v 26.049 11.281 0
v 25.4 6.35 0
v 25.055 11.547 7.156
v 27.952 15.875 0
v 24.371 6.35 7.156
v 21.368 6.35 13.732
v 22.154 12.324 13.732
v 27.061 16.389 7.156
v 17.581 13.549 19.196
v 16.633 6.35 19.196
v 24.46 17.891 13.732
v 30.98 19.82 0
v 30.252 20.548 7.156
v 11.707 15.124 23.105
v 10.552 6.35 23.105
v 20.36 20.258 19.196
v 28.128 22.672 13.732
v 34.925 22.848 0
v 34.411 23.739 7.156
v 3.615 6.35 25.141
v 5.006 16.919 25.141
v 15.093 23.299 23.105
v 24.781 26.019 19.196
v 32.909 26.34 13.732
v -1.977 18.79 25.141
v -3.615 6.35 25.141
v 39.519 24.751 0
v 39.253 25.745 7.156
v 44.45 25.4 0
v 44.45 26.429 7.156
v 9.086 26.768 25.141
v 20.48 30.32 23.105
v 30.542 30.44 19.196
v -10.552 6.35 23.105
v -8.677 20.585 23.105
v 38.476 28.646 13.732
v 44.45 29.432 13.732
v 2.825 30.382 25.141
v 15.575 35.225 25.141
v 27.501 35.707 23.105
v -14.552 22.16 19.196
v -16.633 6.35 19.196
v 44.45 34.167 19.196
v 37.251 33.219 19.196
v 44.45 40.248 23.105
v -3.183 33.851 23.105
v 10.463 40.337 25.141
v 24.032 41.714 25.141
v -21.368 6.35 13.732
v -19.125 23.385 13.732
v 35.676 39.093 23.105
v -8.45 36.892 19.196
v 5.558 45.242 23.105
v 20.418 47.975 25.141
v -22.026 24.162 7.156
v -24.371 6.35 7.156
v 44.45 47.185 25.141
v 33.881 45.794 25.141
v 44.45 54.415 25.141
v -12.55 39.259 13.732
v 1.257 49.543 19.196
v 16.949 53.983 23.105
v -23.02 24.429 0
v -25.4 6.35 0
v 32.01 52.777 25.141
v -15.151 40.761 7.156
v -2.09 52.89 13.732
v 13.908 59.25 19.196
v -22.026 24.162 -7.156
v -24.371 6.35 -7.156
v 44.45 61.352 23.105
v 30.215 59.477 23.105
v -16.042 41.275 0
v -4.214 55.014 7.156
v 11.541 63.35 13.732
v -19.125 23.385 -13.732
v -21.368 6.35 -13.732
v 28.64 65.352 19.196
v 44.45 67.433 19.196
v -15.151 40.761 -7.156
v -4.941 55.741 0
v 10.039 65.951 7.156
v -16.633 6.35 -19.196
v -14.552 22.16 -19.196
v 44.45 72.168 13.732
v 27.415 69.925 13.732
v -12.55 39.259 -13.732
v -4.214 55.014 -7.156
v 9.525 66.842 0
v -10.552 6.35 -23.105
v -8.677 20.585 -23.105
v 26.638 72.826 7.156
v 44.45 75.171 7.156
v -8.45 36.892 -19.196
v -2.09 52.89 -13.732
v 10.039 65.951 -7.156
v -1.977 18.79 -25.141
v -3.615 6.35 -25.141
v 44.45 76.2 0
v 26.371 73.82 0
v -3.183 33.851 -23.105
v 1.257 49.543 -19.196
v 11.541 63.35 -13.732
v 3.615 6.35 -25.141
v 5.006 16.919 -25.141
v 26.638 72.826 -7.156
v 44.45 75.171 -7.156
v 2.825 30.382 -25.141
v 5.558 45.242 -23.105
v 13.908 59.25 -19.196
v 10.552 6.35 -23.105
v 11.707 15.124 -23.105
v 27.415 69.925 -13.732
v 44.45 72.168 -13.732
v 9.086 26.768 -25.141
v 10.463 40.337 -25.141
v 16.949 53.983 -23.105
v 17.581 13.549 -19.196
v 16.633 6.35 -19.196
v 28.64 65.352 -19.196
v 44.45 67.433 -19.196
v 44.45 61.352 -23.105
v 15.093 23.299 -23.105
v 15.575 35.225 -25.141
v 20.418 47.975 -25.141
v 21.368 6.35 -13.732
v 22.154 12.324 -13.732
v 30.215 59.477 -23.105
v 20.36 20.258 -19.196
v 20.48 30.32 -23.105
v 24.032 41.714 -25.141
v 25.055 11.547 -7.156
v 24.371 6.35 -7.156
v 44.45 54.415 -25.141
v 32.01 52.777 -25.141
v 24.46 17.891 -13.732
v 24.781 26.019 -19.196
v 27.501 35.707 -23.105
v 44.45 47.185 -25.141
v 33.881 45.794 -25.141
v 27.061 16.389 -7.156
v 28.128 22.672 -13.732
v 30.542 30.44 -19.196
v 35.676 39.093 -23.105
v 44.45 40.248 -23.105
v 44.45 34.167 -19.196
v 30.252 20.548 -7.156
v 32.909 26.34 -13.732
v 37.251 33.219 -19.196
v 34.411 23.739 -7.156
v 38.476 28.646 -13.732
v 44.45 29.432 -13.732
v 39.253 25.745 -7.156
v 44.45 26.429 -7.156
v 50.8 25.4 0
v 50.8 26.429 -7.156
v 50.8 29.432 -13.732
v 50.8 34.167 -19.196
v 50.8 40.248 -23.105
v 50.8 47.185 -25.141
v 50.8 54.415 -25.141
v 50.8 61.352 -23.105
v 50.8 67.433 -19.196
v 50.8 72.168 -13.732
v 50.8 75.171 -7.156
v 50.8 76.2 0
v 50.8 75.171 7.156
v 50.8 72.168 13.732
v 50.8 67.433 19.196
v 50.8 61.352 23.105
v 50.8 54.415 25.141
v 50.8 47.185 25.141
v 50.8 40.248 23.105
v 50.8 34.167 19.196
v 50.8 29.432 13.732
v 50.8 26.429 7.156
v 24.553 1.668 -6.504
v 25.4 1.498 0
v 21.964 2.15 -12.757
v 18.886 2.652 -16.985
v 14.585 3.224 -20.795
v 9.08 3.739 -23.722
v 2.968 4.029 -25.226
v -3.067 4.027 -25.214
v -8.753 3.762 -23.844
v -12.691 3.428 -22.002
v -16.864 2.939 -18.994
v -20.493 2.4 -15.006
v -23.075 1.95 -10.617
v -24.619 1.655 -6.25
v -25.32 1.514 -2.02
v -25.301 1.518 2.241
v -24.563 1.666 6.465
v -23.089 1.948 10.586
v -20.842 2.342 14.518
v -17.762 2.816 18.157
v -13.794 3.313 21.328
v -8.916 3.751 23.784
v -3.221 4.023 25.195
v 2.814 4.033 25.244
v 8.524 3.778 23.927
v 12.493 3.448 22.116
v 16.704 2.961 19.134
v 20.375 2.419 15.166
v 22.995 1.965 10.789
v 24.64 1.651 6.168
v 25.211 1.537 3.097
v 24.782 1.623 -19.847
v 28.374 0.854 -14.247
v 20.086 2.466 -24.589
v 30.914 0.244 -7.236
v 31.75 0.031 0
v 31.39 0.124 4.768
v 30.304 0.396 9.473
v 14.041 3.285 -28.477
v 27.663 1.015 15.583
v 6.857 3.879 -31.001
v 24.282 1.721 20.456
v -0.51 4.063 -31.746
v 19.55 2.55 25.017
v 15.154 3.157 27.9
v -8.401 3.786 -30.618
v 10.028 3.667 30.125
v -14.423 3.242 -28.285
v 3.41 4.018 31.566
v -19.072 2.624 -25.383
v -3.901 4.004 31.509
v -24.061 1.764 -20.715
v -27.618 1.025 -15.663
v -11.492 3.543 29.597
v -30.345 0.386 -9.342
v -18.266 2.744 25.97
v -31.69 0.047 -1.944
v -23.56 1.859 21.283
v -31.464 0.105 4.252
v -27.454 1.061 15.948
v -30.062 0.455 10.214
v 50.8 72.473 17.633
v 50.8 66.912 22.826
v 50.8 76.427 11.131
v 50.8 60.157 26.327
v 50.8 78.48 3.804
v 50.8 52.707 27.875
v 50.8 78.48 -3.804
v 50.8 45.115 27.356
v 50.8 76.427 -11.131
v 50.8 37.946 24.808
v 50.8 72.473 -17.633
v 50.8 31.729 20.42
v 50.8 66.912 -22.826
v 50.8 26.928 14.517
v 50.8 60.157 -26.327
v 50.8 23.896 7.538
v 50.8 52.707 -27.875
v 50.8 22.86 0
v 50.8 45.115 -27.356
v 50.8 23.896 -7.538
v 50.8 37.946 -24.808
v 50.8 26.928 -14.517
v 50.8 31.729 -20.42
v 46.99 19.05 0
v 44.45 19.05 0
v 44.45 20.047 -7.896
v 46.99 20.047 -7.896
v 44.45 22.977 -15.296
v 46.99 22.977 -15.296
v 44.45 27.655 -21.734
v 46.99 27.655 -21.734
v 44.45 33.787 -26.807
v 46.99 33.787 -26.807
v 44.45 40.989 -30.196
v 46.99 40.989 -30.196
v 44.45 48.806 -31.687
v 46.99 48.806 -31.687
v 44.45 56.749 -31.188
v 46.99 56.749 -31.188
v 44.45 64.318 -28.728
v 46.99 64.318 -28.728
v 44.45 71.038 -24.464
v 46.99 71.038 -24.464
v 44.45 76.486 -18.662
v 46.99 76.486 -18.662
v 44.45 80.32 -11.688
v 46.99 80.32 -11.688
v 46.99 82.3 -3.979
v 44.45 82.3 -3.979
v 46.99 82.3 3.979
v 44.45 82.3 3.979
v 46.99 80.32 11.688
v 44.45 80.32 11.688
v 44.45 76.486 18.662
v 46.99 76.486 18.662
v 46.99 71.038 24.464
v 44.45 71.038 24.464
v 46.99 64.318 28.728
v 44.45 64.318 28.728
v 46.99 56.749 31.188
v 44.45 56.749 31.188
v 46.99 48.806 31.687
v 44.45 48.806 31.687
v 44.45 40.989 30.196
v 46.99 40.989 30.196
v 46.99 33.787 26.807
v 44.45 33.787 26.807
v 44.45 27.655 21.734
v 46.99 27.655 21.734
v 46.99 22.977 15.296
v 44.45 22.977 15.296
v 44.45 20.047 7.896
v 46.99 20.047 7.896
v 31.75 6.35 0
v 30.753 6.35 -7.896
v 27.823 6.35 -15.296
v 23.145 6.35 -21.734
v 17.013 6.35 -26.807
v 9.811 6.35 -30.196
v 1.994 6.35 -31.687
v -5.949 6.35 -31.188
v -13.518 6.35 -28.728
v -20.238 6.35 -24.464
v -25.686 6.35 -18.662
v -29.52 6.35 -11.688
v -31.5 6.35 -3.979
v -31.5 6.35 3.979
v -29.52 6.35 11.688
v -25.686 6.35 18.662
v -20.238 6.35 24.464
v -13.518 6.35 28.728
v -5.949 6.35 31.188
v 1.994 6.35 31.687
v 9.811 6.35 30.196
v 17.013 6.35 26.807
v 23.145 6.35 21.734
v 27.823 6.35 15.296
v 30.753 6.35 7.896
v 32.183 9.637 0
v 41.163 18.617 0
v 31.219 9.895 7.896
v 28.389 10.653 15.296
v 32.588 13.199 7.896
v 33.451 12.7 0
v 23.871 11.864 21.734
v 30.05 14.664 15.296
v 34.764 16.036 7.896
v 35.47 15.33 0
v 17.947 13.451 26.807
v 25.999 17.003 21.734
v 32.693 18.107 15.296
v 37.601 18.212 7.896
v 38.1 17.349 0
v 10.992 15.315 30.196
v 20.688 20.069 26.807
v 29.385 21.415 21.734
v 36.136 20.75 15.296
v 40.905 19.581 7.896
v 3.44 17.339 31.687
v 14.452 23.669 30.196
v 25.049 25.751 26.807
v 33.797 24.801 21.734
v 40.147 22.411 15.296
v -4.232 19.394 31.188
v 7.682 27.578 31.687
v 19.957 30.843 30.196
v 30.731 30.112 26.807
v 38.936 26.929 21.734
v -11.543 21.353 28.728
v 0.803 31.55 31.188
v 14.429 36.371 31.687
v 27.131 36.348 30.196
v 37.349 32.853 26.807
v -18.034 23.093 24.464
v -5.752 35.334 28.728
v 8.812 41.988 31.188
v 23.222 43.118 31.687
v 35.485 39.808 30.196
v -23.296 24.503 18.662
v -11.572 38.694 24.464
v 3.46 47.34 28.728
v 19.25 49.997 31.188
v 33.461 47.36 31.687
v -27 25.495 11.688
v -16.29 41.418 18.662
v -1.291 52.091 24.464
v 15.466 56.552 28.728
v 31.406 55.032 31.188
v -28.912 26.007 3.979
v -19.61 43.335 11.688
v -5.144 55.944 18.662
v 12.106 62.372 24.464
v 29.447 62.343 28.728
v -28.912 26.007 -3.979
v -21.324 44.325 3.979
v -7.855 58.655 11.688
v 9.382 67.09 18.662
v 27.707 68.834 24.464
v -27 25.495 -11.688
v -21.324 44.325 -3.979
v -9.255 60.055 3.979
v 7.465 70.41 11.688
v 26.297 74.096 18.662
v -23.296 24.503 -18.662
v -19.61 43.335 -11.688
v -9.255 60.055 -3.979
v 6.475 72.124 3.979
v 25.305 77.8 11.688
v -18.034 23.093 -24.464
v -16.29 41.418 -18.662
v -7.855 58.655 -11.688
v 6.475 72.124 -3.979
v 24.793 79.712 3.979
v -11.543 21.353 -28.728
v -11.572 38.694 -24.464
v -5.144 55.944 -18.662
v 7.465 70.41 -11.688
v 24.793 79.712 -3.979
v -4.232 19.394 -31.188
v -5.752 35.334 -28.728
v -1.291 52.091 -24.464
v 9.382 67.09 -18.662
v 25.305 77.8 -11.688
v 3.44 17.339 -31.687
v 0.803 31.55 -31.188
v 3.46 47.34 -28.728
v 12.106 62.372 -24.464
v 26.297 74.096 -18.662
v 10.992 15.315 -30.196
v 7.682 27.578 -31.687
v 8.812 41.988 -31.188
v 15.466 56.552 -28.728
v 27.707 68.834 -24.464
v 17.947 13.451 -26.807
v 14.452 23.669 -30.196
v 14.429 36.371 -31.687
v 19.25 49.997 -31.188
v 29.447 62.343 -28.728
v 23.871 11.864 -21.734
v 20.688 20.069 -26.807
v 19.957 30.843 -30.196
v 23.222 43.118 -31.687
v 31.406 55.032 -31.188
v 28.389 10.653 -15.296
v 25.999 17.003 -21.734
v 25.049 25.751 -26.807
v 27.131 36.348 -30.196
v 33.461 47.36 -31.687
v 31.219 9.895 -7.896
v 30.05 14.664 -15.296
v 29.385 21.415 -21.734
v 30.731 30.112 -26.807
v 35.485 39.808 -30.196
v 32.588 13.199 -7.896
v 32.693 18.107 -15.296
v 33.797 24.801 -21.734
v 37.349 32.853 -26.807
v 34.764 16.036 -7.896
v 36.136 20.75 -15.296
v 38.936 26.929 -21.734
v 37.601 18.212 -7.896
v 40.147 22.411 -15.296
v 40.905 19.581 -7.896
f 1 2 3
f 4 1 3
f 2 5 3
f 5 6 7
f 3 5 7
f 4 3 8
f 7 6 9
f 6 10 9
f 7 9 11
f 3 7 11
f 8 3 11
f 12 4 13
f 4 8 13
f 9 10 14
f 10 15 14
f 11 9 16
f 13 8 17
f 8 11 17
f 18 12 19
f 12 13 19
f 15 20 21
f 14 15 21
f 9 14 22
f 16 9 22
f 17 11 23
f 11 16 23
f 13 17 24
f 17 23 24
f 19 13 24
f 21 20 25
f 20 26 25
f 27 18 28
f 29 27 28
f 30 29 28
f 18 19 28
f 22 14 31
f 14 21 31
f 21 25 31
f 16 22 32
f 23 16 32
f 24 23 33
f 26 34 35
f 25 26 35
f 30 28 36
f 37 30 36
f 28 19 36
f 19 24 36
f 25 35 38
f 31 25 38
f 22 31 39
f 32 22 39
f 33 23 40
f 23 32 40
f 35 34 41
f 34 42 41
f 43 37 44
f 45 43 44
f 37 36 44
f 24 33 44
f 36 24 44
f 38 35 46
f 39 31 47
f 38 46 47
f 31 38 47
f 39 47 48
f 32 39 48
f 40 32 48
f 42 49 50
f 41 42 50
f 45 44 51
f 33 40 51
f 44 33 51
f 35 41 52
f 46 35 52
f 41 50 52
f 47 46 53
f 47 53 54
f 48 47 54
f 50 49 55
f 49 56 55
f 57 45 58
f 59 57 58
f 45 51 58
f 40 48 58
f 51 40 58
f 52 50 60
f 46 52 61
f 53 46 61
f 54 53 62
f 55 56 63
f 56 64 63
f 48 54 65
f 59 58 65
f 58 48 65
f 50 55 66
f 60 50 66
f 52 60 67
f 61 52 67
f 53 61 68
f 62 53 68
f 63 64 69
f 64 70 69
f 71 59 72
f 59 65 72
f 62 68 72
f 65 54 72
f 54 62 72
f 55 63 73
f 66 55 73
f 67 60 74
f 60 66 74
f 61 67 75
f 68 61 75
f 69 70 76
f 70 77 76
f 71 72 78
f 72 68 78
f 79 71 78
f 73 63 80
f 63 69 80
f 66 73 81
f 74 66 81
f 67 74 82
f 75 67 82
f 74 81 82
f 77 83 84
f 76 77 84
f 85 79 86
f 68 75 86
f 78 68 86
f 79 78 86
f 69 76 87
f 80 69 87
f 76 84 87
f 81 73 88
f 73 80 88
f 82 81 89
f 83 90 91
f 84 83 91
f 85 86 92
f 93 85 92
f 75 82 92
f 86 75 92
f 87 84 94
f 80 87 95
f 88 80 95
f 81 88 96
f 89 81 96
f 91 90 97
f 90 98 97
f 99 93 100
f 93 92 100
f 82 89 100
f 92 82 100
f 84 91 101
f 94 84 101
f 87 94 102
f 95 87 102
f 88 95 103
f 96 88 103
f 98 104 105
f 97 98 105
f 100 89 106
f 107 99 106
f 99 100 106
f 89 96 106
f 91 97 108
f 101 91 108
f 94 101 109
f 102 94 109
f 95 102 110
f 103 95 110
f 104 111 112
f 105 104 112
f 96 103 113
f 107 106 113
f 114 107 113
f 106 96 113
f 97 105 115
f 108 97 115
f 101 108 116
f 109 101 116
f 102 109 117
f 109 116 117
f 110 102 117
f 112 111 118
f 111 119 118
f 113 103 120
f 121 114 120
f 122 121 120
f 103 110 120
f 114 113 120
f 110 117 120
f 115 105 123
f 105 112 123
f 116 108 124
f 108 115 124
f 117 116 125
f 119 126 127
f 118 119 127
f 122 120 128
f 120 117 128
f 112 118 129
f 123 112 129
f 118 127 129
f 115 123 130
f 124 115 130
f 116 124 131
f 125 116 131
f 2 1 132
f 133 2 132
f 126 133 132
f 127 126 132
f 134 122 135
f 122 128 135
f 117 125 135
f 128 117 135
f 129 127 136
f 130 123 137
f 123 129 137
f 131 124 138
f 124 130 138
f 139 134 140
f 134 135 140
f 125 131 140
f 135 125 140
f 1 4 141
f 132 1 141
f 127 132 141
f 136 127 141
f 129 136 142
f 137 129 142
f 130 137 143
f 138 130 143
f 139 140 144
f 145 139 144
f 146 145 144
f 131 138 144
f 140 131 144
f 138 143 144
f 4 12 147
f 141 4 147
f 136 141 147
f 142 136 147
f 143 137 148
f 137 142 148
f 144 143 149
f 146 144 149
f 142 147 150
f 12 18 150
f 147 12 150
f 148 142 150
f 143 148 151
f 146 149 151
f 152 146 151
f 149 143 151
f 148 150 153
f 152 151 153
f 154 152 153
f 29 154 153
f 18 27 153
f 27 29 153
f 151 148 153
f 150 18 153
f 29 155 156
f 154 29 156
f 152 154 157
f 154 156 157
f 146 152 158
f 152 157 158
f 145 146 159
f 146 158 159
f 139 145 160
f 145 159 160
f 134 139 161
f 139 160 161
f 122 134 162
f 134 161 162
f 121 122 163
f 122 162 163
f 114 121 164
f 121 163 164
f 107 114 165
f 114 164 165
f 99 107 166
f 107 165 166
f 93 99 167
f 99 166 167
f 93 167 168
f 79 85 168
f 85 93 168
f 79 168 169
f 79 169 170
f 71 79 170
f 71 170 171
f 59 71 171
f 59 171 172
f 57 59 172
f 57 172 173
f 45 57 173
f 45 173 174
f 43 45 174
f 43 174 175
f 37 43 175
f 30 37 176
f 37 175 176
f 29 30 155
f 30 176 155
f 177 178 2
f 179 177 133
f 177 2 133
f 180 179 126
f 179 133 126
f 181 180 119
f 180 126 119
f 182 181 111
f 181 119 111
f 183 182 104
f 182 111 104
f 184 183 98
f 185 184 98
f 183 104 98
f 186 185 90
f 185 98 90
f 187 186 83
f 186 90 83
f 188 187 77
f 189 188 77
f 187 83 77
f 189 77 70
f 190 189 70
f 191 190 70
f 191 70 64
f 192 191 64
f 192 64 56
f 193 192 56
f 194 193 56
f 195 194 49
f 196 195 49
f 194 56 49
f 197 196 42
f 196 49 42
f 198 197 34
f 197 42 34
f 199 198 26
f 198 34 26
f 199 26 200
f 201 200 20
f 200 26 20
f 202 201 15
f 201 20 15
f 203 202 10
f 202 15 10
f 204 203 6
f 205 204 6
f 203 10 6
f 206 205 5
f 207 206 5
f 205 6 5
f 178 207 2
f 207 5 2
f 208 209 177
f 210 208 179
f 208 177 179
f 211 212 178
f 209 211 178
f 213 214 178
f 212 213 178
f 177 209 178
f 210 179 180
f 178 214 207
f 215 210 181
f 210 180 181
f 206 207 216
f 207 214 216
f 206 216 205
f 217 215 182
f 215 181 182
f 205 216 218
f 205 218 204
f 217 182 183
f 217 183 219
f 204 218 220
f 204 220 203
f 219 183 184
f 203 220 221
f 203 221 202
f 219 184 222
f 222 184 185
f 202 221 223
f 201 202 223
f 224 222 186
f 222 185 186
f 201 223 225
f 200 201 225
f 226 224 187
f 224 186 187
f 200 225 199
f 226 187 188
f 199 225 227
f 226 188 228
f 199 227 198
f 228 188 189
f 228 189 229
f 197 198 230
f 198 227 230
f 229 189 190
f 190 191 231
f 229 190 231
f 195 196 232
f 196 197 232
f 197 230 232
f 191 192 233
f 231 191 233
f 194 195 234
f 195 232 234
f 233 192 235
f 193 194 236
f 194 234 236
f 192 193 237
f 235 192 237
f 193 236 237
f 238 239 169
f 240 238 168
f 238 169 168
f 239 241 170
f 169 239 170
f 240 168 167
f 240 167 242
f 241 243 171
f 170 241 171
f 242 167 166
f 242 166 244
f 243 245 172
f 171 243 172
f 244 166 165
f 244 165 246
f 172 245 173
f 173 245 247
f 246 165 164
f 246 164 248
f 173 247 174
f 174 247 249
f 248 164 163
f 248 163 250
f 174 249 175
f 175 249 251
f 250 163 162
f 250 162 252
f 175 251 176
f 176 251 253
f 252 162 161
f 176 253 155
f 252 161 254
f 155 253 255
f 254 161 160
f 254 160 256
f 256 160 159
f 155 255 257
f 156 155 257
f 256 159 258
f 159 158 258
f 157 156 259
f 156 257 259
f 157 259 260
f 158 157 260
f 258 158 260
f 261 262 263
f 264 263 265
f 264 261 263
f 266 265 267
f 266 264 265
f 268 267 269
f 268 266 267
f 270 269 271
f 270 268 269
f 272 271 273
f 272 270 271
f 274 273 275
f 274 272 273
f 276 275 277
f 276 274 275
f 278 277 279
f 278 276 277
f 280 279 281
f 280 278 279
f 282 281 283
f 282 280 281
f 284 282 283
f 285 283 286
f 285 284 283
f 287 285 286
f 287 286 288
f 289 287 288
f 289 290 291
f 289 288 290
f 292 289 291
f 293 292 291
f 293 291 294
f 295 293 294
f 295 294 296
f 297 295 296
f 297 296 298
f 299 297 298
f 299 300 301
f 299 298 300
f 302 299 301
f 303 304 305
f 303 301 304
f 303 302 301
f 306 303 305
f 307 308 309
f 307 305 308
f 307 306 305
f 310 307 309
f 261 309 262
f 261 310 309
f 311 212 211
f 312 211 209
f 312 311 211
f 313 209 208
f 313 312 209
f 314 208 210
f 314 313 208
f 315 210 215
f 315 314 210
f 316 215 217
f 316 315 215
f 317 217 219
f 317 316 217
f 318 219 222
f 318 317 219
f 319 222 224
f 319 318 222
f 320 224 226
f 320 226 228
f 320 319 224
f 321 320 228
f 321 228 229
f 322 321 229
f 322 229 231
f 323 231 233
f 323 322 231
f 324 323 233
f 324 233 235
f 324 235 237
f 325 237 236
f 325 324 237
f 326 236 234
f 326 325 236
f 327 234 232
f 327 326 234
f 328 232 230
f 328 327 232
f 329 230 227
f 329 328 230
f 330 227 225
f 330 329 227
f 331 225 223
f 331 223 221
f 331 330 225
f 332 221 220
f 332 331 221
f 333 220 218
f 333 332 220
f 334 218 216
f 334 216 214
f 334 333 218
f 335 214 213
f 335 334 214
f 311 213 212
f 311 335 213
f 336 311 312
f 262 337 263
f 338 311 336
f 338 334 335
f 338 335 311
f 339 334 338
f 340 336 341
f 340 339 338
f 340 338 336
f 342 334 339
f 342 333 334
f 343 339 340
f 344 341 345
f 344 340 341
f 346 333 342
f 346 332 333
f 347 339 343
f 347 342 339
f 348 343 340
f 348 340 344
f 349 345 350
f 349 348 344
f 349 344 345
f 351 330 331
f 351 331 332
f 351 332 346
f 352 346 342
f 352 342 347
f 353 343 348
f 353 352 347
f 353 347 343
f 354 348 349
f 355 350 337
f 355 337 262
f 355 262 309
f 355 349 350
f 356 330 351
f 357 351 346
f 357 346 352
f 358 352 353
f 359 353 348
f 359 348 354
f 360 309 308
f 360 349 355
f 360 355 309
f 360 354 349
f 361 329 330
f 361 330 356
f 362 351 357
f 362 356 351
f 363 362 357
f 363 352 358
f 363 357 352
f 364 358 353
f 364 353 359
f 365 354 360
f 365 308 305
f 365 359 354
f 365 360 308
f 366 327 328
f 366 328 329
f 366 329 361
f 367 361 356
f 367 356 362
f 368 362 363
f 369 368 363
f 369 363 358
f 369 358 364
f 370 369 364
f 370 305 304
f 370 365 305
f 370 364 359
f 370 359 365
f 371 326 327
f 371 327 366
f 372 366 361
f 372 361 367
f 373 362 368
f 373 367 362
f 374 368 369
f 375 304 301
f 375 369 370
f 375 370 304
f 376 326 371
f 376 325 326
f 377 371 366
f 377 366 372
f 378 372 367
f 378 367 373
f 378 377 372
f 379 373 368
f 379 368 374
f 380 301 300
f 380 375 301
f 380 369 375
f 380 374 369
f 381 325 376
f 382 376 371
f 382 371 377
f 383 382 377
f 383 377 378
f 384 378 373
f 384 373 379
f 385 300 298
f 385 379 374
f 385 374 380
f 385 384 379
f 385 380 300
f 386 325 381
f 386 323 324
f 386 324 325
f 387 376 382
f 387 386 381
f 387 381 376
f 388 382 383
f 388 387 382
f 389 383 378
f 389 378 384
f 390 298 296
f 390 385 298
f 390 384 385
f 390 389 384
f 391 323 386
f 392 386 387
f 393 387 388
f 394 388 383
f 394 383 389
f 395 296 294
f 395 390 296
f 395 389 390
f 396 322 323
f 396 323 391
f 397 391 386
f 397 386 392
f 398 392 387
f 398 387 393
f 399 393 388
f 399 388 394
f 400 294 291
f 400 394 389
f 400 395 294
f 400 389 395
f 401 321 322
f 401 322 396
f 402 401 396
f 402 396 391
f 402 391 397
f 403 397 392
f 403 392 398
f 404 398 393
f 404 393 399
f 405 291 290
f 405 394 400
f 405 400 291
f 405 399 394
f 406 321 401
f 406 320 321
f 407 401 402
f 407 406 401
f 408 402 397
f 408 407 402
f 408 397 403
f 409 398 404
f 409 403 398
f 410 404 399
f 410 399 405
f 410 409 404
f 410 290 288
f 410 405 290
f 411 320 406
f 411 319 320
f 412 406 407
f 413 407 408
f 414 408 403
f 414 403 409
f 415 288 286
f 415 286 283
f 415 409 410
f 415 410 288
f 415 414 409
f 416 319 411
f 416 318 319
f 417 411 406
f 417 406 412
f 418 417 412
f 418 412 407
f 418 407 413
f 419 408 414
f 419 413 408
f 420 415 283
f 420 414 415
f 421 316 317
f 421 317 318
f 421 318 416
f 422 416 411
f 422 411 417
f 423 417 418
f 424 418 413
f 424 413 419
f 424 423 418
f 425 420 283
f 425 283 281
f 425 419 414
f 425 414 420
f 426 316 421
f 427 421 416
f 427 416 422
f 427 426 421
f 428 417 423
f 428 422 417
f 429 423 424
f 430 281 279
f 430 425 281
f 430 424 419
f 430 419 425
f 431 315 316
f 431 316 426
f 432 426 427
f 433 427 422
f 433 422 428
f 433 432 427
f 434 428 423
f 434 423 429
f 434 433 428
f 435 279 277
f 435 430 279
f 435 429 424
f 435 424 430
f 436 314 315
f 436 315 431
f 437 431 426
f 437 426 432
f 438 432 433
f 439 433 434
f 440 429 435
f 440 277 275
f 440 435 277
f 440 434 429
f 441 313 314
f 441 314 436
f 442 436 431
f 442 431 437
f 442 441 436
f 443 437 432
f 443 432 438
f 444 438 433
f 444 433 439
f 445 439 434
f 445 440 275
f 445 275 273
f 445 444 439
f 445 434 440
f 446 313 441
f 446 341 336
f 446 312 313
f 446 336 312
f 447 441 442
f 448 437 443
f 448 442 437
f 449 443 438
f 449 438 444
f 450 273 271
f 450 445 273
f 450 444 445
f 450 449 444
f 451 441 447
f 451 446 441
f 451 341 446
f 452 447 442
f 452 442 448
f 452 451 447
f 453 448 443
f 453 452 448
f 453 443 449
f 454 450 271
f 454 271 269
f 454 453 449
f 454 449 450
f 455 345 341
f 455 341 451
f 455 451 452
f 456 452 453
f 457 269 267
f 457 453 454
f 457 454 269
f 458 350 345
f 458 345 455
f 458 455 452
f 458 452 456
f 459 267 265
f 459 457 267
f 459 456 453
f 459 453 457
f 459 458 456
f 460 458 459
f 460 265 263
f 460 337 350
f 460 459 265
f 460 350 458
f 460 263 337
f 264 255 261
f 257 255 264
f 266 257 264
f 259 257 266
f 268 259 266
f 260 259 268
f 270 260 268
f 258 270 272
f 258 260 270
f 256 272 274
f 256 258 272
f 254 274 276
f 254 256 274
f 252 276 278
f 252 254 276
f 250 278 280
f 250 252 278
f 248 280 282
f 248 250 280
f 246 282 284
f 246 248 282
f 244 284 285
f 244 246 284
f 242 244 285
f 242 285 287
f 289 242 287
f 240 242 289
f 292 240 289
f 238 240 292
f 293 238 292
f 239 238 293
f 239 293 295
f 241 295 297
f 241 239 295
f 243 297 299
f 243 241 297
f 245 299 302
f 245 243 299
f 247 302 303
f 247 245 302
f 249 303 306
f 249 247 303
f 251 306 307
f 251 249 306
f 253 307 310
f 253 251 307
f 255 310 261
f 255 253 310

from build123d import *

# Parameters (mm, degrees)
F1_R     = 31.75
F1_R_2   = 25.399999693
F3_R     = 127
F4_DEPTH = 50.8
F5_SIZE  = 3.81


with BuildPart() as f2:
    # F2: sweep along a path in F0
    with BuildLine(Plane.XY) as f2_path:
        Line((0, 0), (0, 6.35))
        ThreePointArc((0, 6.35), (13.0191035763, 37.7808964237), (44.45, 50.8))
        Line((44.45, 50.8), (50.8, 50.8))
    # F1 (on Front) → F2 (sweep)
    with BuildSketch(Plane.XZ):
        Circle(F1_R)
        Circle(F1_R_2, mode=Mode.SUBTRACT)
    sweep(path=f2_path.line)

    # F3 (on Top) → F4 (cut, symmetric)
    with BuildSketch(Plane.XY):
        with Locations((0, -122.936)):
            Circle(F3_R)
    extrude(amount=F4_DEPTH, both=True, mode=Mode.SUBTRACT)

    # F5
    f5_edges = [f2.edges().sort_by_distance(p)[0] for p in [
        (50.8, 82.55, 0),
    ]]
    chamfer(f5_edges, length=F5_SIZE)


solid = f2.part
